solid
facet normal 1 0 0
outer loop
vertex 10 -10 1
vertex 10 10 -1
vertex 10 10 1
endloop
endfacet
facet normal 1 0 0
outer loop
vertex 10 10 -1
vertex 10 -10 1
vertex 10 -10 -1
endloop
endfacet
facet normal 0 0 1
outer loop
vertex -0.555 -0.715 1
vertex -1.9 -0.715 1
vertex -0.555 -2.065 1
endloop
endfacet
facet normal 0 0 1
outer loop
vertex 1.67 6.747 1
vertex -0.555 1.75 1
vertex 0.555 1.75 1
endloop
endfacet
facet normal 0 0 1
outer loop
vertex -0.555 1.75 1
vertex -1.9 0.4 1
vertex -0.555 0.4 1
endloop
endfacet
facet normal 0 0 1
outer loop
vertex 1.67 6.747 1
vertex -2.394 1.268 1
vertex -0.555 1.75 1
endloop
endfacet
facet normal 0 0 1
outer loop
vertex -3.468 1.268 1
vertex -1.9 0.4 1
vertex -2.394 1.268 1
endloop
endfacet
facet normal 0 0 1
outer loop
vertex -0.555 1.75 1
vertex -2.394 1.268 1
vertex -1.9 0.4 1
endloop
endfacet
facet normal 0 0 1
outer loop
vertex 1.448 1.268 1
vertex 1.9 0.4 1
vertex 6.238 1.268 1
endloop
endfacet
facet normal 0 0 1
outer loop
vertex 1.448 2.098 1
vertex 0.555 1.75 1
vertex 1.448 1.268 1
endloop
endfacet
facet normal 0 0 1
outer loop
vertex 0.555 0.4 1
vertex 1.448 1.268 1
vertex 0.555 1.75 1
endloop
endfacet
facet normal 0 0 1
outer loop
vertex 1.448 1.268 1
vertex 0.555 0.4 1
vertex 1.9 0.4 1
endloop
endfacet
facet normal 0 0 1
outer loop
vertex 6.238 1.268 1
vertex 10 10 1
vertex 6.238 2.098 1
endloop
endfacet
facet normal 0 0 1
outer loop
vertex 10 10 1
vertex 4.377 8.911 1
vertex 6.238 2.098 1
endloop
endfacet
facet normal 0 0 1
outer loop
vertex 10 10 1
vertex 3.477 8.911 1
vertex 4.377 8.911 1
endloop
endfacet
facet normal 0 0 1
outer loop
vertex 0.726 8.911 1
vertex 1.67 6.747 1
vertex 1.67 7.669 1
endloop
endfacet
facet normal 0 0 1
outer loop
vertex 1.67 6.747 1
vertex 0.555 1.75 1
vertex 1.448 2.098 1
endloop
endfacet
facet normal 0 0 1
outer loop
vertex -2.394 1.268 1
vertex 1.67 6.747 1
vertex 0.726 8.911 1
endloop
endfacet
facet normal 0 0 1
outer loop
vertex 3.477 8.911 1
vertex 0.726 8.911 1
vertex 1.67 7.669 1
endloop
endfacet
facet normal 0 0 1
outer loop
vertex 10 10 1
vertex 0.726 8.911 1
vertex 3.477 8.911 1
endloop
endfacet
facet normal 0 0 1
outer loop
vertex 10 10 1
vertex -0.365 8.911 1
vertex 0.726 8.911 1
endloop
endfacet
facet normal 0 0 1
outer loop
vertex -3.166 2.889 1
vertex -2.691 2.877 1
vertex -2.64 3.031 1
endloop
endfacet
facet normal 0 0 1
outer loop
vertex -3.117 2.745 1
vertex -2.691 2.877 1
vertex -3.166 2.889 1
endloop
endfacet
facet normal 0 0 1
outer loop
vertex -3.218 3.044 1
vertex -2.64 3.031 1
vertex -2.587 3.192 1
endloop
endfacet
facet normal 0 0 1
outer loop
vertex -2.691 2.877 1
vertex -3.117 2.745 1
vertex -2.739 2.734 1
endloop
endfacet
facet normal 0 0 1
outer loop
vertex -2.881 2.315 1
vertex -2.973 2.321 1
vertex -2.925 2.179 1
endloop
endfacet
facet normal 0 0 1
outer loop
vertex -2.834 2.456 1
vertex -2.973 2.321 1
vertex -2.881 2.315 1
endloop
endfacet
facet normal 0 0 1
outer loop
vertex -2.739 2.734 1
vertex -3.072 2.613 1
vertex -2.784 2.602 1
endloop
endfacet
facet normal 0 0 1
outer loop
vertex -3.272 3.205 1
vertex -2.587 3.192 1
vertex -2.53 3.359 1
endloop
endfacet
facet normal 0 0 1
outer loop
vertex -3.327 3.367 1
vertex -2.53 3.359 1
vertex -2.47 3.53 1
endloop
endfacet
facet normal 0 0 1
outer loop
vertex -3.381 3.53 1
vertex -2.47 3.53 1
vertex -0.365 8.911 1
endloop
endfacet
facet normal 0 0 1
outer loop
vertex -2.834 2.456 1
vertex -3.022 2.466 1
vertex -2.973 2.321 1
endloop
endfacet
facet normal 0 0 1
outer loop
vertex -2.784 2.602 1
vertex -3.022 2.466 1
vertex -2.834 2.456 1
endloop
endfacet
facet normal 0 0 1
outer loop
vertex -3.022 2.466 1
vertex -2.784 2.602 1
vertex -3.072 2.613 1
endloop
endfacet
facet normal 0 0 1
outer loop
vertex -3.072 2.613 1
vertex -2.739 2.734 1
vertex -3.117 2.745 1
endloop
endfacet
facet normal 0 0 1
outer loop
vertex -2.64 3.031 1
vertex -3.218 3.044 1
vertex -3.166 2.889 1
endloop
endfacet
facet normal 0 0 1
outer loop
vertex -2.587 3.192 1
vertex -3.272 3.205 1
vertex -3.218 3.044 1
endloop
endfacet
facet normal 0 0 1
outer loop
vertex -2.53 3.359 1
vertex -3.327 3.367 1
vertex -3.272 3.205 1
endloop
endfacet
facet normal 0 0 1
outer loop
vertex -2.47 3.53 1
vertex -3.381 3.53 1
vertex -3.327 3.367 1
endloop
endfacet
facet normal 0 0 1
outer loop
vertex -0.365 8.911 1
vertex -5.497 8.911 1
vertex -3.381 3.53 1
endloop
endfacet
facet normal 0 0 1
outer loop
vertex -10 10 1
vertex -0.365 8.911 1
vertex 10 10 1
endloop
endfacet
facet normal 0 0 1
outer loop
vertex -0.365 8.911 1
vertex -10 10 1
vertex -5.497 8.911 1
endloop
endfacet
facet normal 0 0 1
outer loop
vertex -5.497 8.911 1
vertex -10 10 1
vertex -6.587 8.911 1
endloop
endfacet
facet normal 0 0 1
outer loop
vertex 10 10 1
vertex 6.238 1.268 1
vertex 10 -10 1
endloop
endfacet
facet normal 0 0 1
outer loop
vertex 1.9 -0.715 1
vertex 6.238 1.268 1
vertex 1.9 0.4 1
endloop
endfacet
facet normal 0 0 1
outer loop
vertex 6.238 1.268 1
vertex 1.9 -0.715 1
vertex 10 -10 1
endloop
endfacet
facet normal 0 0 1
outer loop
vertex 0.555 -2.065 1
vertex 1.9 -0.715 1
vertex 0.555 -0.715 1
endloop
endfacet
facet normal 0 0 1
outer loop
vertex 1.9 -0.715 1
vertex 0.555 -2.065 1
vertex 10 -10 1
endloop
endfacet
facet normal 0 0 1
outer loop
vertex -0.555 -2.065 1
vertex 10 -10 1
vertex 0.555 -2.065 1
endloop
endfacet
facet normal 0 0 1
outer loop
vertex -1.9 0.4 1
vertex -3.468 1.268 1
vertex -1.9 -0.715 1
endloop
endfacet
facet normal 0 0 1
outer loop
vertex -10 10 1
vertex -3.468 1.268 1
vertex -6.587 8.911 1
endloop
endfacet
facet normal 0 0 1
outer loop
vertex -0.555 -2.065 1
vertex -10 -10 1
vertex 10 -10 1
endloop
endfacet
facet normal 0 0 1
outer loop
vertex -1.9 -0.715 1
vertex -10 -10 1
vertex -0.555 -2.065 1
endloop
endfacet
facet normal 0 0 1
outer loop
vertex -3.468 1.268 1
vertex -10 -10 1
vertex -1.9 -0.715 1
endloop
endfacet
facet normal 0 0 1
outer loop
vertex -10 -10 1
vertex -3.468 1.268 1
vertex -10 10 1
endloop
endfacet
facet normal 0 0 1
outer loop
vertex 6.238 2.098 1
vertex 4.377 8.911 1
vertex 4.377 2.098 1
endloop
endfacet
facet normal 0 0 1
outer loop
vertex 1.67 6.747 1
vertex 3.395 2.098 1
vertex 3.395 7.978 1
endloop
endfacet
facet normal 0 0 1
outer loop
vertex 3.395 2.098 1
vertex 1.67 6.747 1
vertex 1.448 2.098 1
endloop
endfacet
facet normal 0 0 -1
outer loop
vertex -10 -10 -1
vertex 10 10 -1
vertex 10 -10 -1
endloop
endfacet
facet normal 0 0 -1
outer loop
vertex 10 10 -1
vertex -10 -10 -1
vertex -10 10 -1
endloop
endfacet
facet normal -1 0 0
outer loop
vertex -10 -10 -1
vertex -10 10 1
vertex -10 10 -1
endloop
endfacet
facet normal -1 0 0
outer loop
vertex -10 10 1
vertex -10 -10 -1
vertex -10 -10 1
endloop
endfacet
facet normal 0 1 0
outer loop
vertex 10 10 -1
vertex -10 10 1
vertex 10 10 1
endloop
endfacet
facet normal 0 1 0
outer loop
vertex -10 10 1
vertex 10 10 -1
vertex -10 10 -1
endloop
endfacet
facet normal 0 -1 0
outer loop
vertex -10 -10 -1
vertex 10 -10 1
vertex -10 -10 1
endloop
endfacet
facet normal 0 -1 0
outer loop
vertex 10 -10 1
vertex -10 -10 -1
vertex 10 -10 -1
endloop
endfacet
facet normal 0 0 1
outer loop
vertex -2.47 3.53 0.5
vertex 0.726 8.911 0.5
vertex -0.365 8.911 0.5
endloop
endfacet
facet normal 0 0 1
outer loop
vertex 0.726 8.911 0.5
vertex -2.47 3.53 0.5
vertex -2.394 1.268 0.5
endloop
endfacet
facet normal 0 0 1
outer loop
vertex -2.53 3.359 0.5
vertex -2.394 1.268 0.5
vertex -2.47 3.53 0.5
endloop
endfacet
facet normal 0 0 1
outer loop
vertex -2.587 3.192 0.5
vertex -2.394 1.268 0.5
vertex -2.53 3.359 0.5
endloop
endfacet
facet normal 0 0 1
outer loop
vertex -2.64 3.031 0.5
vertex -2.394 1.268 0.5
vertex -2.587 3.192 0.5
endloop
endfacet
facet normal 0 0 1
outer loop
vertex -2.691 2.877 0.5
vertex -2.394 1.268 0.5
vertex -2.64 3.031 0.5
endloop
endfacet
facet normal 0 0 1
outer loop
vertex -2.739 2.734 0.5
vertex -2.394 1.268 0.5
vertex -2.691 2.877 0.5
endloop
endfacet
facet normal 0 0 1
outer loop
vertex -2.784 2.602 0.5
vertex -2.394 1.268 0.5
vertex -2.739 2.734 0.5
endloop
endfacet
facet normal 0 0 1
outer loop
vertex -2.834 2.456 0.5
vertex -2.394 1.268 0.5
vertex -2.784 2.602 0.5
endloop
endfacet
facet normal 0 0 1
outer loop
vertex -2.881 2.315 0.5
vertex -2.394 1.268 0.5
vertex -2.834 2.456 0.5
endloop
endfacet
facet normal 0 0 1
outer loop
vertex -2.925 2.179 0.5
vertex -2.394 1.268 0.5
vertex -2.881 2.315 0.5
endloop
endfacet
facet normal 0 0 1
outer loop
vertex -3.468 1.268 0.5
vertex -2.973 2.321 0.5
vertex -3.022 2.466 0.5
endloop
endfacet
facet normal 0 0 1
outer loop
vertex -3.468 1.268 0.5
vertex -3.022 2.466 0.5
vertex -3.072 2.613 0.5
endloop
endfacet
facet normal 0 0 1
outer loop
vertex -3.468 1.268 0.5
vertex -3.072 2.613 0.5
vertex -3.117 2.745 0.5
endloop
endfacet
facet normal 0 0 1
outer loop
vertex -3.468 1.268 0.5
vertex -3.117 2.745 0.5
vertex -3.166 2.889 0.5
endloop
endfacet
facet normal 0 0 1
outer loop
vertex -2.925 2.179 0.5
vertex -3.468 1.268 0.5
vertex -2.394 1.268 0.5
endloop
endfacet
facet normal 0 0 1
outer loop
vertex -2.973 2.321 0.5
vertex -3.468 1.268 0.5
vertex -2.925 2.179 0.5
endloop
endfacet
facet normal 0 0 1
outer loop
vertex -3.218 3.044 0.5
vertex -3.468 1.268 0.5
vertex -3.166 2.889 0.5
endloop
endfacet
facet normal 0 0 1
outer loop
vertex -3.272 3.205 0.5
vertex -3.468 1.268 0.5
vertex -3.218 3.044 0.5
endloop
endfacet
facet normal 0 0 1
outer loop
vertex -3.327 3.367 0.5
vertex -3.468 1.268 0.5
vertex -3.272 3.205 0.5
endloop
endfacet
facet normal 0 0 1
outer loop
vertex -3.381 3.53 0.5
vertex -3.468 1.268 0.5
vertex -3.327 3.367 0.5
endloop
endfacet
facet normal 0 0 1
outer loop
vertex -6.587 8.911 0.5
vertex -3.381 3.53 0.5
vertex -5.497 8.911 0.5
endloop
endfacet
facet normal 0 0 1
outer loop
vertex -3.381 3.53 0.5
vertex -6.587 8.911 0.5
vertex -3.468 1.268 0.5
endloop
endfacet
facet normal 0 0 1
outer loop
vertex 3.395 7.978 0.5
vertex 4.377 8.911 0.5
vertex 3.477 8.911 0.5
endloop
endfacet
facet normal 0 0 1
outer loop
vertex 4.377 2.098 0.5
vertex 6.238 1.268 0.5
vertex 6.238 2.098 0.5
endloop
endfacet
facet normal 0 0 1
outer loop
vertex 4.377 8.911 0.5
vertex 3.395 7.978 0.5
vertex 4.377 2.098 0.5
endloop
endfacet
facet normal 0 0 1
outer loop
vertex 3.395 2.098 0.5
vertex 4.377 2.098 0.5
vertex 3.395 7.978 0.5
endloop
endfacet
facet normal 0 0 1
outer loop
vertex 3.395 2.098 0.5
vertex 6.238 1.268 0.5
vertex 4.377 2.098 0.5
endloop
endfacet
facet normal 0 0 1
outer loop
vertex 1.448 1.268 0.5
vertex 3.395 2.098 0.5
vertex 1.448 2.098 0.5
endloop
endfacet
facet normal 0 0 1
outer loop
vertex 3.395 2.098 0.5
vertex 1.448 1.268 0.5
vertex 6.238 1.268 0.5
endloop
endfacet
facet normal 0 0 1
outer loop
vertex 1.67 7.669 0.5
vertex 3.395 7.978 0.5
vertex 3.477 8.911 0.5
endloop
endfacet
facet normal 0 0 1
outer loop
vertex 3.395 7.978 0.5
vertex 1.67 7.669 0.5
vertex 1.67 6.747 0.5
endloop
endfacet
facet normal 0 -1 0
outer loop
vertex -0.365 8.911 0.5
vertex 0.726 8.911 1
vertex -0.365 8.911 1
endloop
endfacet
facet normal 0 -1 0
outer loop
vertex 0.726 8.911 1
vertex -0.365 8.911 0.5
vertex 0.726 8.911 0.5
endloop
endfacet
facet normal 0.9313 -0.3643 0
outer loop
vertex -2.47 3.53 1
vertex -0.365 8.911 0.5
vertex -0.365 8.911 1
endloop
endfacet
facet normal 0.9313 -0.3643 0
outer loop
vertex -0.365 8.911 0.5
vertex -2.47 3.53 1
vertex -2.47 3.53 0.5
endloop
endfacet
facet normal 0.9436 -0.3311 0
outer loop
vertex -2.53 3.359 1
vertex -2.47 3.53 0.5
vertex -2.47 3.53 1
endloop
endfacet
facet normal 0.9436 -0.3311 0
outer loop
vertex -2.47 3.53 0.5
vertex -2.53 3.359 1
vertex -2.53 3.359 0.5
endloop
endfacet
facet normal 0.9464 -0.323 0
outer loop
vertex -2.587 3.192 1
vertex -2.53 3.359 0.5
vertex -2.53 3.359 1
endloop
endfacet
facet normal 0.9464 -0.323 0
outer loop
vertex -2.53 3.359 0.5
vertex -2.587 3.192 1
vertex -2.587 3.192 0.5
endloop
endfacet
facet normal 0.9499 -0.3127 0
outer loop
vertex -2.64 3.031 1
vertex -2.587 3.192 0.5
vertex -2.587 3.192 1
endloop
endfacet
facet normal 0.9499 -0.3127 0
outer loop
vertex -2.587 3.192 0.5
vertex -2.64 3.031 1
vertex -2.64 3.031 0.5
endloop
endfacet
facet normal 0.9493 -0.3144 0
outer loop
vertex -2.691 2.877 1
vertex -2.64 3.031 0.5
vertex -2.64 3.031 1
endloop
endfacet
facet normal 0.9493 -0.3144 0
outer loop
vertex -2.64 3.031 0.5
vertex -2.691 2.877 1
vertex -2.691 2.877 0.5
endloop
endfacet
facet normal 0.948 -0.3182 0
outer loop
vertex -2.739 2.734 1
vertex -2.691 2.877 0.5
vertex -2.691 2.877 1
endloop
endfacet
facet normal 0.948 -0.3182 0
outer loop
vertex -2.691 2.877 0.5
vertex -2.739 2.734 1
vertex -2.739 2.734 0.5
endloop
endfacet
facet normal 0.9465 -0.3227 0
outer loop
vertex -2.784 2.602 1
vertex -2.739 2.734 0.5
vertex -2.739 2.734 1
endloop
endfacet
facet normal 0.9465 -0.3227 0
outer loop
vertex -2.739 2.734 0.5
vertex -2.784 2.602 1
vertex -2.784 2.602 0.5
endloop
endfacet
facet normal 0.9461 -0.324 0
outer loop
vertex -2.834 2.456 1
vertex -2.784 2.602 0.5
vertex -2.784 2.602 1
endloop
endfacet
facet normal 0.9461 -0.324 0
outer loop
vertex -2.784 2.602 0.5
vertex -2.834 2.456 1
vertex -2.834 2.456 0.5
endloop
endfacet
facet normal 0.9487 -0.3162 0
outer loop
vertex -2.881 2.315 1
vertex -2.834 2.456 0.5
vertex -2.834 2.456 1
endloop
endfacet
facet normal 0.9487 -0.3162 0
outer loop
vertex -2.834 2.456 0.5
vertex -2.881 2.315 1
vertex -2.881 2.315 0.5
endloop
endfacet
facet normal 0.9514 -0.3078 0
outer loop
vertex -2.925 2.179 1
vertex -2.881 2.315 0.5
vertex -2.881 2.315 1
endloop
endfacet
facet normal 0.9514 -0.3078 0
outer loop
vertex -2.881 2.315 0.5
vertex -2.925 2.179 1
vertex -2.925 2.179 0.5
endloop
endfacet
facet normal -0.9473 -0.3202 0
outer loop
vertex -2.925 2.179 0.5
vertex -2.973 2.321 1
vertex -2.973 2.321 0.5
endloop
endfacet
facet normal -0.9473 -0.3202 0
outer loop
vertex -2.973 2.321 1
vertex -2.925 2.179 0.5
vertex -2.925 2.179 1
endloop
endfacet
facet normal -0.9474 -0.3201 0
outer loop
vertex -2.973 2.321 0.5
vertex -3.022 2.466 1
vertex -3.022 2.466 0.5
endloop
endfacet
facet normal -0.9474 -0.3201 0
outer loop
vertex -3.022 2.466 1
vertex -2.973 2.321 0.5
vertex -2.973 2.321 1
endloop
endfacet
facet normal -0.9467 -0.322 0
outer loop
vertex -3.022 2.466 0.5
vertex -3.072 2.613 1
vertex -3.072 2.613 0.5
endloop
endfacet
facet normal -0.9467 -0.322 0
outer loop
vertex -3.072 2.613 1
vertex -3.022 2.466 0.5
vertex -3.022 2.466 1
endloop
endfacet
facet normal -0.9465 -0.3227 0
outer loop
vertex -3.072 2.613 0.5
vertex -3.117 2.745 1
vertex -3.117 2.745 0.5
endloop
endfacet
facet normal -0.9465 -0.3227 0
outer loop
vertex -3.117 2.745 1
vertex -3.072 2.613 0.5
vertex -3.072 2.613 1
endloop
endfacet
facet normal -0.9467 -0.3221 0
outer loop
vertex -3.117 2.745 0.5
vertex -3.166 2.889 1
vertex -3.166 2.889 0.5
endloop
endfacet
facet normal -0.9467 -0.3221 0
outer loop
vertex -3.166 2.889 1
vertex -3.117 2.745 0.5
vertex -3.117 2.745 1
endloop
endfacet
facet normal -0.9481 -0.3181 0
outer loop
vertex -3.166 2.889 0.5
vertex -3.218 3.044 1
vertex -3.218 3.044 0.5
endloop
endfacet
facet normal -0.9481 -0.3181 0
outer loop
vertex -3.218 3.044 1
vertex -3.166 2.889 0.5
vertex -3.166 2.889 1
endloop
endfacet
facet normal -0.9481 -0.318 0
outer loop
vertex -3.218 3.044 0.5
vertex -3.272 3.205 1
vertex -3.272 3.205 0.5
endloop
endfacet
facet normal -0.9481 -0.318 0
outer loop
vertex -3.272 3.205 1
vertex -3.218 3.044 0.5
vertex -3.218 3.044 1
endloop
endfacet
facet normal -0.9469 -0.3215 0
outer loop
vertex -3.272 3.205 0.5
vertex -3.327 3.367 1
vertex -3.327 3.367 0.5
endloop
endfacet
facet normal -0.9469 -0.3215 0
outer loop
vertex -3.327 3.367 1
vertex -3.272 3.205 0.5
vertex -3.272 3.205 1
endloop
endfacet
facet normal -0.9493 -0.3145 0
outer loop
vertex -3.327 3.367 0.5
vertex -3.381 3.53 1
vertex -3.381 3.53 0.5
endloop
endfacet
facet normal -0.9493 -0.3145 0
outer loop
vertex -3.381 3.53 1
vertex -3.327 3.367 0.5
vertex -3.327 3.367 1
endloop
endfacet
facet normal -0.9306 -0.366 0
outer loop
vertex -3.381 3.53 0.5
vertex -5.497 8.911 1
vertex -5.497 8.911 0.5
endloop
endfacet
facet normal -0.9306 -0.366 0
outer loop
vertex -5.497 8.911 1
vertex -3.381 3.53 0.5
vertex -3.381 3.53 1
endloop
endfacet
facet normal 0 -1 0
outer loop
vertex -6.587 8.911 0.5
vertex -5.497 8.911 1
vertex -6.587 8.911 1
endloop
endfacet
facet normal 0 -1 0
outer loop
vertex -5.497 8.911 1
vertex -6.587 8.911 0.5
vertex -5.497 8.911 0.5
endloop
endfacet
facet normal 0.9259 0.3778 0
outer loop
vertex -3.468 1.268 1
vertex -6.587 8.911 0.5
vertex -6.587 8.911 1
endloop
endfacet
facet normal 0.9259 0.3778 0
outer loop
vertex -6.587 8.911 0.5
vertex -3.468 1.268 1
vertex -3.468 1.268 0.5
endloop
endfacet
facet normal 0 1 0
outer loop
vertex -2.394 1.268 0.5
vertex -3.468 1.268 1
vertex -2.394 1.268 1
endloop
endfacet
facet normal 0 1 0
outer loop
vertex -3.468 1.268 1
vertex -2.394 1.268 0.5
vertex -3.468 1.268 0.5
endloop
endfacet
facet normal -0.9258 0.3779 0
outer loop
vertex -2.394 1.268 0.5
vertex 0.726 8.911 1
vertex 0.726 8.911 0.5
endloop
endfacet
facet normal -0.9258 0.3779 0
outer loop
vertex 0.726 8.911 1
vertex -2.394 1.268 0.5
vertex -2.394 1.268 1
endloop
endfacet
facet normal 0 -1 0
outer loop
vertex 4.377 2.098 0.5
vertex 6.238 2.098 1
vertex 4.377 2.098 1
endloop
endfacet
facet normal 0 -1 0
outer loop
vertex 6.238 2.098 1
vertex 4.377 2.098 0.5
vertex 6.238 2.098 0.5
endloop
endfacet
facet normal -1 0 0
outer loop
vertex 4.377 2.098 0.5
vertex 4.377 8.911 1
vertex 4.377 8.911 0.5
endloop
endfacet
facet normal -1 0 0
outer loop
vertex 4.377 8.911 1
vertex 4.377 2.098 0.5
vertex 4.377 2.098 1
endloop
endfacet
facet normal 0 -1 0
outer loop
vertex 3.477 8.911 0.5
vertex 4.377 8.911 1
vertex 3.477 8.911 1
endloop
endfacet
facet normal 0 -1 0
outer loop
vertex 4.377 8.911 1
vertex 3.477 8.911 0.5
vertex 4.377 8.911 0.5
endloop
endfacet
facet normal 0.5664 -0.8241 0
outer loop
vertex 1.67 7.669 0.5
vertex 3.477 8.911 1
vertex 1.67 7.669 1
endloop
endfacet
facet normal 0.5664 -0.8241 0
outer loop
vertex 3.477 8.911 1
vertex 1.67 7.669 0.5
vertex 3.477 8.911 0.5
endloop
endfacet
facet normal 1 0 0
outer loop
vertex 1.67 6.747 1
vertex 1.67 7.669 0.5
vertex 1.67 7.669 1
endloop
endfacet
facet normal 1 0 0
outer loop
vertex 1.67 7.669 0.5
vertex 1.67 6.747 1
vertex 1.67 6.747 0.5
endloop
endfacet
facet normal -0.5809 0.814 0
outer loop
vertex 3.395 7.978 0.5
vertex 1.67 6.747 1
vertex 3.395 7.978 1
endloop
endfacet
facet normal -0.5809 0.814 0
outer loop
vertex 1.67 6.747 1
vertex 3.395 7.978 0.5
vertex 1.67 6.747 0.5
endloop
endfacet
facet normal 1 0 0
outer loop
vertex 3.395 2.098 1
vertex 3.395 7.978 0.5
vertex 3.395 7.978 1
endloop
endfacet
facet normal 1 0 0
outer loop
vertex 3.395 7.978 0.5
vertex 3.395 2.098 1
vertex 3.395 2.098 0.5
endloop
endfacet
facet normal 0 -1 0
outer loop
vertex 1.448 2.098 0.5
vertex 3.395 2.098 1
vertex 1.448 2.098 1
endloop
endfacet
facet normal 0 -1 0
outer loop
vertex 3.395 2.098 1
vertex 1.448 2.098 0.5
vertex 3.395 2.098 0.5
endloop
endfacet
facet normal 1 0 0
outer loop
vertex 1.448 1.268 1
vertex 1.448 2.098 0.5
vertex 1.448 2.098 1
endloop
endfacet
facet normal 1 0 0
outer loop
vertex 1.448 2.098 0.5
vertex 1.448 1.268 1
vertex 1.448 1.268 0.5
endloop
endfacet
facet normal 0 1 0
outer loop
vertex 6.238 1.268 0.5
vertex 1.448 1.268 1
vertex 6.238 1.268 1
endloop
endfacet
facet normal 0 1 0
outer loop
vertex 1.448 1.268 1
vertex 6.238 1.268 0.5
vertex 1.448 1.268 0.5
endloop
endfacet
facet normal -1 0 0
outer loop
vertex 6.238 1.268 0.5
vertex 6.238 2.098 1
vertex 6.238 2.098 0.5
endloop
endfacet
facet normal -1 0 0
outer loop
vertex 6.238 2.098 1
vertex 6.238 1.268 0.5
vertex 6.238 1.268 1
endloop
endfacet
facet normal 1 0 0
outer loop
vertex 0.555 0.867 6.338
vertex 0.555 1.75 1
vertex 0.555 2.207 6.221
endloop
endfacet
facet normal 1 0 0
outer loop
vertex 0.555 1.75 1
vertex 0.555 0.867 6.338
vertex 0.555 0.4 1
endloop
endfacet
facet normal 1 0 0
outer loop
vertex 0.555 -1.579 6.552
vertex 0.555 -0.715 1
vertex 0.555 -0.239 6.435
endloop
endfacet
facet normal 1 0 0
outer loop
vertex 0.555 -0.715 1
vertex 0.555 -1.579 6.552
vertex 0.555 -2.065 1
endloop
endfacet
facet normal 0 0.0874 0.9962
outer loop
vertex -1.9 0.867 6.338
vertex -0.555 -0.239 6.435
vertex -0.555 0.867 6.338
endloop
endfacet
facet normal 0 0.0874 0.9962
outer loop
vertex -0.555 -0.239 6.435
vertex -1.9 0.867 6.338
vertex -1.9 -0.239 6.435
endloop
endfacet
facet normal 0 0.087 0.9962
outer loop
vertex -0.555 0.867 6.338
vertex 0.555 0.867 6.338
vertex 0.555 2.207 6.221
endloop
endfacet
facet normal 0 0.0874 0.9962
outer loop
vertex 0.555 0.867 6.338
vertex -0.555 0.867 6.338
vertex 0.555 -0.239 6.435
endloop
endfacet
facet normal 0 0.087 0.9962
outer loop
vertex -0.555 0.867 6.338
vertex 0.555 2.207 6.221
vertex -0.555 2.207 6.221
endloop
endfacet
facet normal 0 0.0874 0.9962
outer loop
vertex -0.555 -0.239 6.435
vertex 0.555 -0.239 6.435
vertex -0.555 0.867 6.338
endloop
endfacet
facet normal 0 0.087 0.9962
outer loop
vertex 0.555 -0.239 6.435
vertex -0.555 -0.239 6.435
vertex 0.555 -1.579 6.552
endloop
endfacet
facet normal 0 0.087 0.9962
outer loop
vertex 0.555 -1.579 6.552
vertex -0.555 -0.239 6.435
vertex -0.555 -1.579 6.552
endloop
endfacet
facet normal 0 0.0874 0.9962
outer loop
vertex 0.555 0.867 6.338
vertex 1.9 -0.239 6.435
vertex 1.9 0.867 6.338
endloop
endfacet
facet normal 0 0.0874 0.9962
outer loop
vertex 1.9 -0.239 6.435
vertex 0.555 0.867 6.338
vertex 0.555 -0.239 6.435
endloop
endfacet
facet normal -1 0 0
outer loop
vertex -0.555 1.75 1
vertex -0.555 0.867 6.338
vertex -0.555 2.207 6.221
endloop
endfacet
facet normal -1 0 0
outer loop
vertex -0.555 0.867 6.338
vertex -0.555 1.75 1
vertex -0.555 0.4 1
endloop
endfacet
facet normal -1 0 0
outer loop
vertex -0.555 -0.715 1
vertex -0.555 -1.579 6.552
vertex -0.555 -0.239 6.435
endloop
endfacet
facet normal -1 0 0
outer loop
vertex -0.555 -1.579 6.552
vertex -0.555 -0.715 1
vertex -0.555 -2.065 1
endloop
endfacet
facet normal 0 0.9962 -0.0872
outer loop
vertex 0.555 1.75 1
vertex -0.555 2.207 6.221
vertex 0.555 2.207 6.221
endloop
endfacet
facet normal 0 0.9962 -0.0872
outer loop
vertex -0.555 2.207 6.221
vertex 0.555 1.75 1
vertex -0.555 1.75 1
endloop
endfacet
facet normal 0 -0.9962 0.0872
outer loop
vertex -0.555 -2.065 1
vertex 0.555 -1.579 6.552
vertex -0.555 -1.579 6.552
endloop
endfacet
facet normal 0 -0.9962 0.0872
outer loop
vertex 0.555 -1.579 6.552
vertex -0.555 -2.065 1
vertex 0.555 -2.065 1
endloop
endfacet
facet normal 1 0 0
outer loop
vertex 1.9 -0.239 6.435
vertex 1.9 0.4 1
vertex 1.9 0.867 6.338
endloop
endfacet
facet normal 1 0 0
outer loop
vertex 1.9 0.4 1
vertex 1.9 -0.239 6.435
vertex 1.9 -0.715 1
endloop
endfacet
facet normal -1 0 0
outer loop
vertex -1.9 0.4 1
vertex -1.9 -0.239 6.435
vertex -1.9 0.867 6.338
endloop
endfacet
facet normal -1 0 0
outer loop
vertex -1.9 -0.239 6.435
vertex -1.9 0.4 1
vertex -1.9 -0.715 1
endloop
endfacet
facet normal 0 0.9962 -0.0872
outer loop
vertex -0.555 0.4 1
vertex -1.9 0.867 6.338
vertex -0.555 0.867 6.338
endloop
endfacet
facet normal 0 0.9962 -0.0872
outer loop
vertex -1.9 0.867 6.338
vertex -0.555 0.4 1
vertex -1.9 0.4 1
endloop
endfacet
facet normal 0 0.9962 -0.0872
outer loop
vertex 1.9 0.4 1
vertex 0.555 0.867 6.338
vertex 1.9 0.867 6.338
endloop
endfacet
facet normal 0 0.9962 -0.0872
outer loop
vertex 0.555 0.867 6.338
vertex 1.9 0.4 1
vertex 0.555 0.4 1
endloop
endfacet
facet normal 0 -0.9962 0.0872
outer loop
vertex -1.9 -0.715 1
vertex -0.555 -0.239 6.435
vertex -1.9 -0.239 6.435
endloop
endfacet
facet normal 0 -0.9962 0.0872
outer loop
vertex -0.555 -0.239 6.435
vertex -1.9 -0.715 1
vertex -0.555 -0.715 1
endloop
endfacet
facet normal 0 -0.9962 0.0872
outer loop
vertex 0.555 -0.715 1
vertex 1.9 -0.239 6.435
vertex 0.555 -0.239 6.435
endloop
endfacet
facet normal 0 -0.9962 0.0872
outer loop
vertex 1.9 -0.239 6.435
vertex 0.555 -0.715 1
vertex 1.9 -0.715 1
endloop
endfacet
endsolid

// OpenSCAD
// Cherry MX keycap holder for laser engraving

cross_x = 4;
cross_y = 1.31;
cross_z = 3.6;
cross_tolerance = 0.2;
plate_z = 2 ;
key_slope = 5 ; // 5 degrees approx.

//versioning
letter_size = 8;
letter_height = 2;
font = "Liberation Sans";
Version = "V1" ;

module letter(l) {
	linear_extrude(height = letter_height) {
		text(l, size = letter_size, font = font, halign = "center", valign = "center", $fn = 16);
	}
}
difference() {
    cube([20,20,plate_z],center=true);
    translate([0,5,plate_z/4]) letter(Version);
}
translate([0,0,plate_z/2+cross_z/2]) rotate([-5,0,0]) {
    cube([cross_y-cross_tolerance, cross_x-cross_tolerance, cross_z*2], center=true);
    cube([cross_x-cross_tolerance, cross_y-cross_tolerance, cross_z*2], center=true);
}
